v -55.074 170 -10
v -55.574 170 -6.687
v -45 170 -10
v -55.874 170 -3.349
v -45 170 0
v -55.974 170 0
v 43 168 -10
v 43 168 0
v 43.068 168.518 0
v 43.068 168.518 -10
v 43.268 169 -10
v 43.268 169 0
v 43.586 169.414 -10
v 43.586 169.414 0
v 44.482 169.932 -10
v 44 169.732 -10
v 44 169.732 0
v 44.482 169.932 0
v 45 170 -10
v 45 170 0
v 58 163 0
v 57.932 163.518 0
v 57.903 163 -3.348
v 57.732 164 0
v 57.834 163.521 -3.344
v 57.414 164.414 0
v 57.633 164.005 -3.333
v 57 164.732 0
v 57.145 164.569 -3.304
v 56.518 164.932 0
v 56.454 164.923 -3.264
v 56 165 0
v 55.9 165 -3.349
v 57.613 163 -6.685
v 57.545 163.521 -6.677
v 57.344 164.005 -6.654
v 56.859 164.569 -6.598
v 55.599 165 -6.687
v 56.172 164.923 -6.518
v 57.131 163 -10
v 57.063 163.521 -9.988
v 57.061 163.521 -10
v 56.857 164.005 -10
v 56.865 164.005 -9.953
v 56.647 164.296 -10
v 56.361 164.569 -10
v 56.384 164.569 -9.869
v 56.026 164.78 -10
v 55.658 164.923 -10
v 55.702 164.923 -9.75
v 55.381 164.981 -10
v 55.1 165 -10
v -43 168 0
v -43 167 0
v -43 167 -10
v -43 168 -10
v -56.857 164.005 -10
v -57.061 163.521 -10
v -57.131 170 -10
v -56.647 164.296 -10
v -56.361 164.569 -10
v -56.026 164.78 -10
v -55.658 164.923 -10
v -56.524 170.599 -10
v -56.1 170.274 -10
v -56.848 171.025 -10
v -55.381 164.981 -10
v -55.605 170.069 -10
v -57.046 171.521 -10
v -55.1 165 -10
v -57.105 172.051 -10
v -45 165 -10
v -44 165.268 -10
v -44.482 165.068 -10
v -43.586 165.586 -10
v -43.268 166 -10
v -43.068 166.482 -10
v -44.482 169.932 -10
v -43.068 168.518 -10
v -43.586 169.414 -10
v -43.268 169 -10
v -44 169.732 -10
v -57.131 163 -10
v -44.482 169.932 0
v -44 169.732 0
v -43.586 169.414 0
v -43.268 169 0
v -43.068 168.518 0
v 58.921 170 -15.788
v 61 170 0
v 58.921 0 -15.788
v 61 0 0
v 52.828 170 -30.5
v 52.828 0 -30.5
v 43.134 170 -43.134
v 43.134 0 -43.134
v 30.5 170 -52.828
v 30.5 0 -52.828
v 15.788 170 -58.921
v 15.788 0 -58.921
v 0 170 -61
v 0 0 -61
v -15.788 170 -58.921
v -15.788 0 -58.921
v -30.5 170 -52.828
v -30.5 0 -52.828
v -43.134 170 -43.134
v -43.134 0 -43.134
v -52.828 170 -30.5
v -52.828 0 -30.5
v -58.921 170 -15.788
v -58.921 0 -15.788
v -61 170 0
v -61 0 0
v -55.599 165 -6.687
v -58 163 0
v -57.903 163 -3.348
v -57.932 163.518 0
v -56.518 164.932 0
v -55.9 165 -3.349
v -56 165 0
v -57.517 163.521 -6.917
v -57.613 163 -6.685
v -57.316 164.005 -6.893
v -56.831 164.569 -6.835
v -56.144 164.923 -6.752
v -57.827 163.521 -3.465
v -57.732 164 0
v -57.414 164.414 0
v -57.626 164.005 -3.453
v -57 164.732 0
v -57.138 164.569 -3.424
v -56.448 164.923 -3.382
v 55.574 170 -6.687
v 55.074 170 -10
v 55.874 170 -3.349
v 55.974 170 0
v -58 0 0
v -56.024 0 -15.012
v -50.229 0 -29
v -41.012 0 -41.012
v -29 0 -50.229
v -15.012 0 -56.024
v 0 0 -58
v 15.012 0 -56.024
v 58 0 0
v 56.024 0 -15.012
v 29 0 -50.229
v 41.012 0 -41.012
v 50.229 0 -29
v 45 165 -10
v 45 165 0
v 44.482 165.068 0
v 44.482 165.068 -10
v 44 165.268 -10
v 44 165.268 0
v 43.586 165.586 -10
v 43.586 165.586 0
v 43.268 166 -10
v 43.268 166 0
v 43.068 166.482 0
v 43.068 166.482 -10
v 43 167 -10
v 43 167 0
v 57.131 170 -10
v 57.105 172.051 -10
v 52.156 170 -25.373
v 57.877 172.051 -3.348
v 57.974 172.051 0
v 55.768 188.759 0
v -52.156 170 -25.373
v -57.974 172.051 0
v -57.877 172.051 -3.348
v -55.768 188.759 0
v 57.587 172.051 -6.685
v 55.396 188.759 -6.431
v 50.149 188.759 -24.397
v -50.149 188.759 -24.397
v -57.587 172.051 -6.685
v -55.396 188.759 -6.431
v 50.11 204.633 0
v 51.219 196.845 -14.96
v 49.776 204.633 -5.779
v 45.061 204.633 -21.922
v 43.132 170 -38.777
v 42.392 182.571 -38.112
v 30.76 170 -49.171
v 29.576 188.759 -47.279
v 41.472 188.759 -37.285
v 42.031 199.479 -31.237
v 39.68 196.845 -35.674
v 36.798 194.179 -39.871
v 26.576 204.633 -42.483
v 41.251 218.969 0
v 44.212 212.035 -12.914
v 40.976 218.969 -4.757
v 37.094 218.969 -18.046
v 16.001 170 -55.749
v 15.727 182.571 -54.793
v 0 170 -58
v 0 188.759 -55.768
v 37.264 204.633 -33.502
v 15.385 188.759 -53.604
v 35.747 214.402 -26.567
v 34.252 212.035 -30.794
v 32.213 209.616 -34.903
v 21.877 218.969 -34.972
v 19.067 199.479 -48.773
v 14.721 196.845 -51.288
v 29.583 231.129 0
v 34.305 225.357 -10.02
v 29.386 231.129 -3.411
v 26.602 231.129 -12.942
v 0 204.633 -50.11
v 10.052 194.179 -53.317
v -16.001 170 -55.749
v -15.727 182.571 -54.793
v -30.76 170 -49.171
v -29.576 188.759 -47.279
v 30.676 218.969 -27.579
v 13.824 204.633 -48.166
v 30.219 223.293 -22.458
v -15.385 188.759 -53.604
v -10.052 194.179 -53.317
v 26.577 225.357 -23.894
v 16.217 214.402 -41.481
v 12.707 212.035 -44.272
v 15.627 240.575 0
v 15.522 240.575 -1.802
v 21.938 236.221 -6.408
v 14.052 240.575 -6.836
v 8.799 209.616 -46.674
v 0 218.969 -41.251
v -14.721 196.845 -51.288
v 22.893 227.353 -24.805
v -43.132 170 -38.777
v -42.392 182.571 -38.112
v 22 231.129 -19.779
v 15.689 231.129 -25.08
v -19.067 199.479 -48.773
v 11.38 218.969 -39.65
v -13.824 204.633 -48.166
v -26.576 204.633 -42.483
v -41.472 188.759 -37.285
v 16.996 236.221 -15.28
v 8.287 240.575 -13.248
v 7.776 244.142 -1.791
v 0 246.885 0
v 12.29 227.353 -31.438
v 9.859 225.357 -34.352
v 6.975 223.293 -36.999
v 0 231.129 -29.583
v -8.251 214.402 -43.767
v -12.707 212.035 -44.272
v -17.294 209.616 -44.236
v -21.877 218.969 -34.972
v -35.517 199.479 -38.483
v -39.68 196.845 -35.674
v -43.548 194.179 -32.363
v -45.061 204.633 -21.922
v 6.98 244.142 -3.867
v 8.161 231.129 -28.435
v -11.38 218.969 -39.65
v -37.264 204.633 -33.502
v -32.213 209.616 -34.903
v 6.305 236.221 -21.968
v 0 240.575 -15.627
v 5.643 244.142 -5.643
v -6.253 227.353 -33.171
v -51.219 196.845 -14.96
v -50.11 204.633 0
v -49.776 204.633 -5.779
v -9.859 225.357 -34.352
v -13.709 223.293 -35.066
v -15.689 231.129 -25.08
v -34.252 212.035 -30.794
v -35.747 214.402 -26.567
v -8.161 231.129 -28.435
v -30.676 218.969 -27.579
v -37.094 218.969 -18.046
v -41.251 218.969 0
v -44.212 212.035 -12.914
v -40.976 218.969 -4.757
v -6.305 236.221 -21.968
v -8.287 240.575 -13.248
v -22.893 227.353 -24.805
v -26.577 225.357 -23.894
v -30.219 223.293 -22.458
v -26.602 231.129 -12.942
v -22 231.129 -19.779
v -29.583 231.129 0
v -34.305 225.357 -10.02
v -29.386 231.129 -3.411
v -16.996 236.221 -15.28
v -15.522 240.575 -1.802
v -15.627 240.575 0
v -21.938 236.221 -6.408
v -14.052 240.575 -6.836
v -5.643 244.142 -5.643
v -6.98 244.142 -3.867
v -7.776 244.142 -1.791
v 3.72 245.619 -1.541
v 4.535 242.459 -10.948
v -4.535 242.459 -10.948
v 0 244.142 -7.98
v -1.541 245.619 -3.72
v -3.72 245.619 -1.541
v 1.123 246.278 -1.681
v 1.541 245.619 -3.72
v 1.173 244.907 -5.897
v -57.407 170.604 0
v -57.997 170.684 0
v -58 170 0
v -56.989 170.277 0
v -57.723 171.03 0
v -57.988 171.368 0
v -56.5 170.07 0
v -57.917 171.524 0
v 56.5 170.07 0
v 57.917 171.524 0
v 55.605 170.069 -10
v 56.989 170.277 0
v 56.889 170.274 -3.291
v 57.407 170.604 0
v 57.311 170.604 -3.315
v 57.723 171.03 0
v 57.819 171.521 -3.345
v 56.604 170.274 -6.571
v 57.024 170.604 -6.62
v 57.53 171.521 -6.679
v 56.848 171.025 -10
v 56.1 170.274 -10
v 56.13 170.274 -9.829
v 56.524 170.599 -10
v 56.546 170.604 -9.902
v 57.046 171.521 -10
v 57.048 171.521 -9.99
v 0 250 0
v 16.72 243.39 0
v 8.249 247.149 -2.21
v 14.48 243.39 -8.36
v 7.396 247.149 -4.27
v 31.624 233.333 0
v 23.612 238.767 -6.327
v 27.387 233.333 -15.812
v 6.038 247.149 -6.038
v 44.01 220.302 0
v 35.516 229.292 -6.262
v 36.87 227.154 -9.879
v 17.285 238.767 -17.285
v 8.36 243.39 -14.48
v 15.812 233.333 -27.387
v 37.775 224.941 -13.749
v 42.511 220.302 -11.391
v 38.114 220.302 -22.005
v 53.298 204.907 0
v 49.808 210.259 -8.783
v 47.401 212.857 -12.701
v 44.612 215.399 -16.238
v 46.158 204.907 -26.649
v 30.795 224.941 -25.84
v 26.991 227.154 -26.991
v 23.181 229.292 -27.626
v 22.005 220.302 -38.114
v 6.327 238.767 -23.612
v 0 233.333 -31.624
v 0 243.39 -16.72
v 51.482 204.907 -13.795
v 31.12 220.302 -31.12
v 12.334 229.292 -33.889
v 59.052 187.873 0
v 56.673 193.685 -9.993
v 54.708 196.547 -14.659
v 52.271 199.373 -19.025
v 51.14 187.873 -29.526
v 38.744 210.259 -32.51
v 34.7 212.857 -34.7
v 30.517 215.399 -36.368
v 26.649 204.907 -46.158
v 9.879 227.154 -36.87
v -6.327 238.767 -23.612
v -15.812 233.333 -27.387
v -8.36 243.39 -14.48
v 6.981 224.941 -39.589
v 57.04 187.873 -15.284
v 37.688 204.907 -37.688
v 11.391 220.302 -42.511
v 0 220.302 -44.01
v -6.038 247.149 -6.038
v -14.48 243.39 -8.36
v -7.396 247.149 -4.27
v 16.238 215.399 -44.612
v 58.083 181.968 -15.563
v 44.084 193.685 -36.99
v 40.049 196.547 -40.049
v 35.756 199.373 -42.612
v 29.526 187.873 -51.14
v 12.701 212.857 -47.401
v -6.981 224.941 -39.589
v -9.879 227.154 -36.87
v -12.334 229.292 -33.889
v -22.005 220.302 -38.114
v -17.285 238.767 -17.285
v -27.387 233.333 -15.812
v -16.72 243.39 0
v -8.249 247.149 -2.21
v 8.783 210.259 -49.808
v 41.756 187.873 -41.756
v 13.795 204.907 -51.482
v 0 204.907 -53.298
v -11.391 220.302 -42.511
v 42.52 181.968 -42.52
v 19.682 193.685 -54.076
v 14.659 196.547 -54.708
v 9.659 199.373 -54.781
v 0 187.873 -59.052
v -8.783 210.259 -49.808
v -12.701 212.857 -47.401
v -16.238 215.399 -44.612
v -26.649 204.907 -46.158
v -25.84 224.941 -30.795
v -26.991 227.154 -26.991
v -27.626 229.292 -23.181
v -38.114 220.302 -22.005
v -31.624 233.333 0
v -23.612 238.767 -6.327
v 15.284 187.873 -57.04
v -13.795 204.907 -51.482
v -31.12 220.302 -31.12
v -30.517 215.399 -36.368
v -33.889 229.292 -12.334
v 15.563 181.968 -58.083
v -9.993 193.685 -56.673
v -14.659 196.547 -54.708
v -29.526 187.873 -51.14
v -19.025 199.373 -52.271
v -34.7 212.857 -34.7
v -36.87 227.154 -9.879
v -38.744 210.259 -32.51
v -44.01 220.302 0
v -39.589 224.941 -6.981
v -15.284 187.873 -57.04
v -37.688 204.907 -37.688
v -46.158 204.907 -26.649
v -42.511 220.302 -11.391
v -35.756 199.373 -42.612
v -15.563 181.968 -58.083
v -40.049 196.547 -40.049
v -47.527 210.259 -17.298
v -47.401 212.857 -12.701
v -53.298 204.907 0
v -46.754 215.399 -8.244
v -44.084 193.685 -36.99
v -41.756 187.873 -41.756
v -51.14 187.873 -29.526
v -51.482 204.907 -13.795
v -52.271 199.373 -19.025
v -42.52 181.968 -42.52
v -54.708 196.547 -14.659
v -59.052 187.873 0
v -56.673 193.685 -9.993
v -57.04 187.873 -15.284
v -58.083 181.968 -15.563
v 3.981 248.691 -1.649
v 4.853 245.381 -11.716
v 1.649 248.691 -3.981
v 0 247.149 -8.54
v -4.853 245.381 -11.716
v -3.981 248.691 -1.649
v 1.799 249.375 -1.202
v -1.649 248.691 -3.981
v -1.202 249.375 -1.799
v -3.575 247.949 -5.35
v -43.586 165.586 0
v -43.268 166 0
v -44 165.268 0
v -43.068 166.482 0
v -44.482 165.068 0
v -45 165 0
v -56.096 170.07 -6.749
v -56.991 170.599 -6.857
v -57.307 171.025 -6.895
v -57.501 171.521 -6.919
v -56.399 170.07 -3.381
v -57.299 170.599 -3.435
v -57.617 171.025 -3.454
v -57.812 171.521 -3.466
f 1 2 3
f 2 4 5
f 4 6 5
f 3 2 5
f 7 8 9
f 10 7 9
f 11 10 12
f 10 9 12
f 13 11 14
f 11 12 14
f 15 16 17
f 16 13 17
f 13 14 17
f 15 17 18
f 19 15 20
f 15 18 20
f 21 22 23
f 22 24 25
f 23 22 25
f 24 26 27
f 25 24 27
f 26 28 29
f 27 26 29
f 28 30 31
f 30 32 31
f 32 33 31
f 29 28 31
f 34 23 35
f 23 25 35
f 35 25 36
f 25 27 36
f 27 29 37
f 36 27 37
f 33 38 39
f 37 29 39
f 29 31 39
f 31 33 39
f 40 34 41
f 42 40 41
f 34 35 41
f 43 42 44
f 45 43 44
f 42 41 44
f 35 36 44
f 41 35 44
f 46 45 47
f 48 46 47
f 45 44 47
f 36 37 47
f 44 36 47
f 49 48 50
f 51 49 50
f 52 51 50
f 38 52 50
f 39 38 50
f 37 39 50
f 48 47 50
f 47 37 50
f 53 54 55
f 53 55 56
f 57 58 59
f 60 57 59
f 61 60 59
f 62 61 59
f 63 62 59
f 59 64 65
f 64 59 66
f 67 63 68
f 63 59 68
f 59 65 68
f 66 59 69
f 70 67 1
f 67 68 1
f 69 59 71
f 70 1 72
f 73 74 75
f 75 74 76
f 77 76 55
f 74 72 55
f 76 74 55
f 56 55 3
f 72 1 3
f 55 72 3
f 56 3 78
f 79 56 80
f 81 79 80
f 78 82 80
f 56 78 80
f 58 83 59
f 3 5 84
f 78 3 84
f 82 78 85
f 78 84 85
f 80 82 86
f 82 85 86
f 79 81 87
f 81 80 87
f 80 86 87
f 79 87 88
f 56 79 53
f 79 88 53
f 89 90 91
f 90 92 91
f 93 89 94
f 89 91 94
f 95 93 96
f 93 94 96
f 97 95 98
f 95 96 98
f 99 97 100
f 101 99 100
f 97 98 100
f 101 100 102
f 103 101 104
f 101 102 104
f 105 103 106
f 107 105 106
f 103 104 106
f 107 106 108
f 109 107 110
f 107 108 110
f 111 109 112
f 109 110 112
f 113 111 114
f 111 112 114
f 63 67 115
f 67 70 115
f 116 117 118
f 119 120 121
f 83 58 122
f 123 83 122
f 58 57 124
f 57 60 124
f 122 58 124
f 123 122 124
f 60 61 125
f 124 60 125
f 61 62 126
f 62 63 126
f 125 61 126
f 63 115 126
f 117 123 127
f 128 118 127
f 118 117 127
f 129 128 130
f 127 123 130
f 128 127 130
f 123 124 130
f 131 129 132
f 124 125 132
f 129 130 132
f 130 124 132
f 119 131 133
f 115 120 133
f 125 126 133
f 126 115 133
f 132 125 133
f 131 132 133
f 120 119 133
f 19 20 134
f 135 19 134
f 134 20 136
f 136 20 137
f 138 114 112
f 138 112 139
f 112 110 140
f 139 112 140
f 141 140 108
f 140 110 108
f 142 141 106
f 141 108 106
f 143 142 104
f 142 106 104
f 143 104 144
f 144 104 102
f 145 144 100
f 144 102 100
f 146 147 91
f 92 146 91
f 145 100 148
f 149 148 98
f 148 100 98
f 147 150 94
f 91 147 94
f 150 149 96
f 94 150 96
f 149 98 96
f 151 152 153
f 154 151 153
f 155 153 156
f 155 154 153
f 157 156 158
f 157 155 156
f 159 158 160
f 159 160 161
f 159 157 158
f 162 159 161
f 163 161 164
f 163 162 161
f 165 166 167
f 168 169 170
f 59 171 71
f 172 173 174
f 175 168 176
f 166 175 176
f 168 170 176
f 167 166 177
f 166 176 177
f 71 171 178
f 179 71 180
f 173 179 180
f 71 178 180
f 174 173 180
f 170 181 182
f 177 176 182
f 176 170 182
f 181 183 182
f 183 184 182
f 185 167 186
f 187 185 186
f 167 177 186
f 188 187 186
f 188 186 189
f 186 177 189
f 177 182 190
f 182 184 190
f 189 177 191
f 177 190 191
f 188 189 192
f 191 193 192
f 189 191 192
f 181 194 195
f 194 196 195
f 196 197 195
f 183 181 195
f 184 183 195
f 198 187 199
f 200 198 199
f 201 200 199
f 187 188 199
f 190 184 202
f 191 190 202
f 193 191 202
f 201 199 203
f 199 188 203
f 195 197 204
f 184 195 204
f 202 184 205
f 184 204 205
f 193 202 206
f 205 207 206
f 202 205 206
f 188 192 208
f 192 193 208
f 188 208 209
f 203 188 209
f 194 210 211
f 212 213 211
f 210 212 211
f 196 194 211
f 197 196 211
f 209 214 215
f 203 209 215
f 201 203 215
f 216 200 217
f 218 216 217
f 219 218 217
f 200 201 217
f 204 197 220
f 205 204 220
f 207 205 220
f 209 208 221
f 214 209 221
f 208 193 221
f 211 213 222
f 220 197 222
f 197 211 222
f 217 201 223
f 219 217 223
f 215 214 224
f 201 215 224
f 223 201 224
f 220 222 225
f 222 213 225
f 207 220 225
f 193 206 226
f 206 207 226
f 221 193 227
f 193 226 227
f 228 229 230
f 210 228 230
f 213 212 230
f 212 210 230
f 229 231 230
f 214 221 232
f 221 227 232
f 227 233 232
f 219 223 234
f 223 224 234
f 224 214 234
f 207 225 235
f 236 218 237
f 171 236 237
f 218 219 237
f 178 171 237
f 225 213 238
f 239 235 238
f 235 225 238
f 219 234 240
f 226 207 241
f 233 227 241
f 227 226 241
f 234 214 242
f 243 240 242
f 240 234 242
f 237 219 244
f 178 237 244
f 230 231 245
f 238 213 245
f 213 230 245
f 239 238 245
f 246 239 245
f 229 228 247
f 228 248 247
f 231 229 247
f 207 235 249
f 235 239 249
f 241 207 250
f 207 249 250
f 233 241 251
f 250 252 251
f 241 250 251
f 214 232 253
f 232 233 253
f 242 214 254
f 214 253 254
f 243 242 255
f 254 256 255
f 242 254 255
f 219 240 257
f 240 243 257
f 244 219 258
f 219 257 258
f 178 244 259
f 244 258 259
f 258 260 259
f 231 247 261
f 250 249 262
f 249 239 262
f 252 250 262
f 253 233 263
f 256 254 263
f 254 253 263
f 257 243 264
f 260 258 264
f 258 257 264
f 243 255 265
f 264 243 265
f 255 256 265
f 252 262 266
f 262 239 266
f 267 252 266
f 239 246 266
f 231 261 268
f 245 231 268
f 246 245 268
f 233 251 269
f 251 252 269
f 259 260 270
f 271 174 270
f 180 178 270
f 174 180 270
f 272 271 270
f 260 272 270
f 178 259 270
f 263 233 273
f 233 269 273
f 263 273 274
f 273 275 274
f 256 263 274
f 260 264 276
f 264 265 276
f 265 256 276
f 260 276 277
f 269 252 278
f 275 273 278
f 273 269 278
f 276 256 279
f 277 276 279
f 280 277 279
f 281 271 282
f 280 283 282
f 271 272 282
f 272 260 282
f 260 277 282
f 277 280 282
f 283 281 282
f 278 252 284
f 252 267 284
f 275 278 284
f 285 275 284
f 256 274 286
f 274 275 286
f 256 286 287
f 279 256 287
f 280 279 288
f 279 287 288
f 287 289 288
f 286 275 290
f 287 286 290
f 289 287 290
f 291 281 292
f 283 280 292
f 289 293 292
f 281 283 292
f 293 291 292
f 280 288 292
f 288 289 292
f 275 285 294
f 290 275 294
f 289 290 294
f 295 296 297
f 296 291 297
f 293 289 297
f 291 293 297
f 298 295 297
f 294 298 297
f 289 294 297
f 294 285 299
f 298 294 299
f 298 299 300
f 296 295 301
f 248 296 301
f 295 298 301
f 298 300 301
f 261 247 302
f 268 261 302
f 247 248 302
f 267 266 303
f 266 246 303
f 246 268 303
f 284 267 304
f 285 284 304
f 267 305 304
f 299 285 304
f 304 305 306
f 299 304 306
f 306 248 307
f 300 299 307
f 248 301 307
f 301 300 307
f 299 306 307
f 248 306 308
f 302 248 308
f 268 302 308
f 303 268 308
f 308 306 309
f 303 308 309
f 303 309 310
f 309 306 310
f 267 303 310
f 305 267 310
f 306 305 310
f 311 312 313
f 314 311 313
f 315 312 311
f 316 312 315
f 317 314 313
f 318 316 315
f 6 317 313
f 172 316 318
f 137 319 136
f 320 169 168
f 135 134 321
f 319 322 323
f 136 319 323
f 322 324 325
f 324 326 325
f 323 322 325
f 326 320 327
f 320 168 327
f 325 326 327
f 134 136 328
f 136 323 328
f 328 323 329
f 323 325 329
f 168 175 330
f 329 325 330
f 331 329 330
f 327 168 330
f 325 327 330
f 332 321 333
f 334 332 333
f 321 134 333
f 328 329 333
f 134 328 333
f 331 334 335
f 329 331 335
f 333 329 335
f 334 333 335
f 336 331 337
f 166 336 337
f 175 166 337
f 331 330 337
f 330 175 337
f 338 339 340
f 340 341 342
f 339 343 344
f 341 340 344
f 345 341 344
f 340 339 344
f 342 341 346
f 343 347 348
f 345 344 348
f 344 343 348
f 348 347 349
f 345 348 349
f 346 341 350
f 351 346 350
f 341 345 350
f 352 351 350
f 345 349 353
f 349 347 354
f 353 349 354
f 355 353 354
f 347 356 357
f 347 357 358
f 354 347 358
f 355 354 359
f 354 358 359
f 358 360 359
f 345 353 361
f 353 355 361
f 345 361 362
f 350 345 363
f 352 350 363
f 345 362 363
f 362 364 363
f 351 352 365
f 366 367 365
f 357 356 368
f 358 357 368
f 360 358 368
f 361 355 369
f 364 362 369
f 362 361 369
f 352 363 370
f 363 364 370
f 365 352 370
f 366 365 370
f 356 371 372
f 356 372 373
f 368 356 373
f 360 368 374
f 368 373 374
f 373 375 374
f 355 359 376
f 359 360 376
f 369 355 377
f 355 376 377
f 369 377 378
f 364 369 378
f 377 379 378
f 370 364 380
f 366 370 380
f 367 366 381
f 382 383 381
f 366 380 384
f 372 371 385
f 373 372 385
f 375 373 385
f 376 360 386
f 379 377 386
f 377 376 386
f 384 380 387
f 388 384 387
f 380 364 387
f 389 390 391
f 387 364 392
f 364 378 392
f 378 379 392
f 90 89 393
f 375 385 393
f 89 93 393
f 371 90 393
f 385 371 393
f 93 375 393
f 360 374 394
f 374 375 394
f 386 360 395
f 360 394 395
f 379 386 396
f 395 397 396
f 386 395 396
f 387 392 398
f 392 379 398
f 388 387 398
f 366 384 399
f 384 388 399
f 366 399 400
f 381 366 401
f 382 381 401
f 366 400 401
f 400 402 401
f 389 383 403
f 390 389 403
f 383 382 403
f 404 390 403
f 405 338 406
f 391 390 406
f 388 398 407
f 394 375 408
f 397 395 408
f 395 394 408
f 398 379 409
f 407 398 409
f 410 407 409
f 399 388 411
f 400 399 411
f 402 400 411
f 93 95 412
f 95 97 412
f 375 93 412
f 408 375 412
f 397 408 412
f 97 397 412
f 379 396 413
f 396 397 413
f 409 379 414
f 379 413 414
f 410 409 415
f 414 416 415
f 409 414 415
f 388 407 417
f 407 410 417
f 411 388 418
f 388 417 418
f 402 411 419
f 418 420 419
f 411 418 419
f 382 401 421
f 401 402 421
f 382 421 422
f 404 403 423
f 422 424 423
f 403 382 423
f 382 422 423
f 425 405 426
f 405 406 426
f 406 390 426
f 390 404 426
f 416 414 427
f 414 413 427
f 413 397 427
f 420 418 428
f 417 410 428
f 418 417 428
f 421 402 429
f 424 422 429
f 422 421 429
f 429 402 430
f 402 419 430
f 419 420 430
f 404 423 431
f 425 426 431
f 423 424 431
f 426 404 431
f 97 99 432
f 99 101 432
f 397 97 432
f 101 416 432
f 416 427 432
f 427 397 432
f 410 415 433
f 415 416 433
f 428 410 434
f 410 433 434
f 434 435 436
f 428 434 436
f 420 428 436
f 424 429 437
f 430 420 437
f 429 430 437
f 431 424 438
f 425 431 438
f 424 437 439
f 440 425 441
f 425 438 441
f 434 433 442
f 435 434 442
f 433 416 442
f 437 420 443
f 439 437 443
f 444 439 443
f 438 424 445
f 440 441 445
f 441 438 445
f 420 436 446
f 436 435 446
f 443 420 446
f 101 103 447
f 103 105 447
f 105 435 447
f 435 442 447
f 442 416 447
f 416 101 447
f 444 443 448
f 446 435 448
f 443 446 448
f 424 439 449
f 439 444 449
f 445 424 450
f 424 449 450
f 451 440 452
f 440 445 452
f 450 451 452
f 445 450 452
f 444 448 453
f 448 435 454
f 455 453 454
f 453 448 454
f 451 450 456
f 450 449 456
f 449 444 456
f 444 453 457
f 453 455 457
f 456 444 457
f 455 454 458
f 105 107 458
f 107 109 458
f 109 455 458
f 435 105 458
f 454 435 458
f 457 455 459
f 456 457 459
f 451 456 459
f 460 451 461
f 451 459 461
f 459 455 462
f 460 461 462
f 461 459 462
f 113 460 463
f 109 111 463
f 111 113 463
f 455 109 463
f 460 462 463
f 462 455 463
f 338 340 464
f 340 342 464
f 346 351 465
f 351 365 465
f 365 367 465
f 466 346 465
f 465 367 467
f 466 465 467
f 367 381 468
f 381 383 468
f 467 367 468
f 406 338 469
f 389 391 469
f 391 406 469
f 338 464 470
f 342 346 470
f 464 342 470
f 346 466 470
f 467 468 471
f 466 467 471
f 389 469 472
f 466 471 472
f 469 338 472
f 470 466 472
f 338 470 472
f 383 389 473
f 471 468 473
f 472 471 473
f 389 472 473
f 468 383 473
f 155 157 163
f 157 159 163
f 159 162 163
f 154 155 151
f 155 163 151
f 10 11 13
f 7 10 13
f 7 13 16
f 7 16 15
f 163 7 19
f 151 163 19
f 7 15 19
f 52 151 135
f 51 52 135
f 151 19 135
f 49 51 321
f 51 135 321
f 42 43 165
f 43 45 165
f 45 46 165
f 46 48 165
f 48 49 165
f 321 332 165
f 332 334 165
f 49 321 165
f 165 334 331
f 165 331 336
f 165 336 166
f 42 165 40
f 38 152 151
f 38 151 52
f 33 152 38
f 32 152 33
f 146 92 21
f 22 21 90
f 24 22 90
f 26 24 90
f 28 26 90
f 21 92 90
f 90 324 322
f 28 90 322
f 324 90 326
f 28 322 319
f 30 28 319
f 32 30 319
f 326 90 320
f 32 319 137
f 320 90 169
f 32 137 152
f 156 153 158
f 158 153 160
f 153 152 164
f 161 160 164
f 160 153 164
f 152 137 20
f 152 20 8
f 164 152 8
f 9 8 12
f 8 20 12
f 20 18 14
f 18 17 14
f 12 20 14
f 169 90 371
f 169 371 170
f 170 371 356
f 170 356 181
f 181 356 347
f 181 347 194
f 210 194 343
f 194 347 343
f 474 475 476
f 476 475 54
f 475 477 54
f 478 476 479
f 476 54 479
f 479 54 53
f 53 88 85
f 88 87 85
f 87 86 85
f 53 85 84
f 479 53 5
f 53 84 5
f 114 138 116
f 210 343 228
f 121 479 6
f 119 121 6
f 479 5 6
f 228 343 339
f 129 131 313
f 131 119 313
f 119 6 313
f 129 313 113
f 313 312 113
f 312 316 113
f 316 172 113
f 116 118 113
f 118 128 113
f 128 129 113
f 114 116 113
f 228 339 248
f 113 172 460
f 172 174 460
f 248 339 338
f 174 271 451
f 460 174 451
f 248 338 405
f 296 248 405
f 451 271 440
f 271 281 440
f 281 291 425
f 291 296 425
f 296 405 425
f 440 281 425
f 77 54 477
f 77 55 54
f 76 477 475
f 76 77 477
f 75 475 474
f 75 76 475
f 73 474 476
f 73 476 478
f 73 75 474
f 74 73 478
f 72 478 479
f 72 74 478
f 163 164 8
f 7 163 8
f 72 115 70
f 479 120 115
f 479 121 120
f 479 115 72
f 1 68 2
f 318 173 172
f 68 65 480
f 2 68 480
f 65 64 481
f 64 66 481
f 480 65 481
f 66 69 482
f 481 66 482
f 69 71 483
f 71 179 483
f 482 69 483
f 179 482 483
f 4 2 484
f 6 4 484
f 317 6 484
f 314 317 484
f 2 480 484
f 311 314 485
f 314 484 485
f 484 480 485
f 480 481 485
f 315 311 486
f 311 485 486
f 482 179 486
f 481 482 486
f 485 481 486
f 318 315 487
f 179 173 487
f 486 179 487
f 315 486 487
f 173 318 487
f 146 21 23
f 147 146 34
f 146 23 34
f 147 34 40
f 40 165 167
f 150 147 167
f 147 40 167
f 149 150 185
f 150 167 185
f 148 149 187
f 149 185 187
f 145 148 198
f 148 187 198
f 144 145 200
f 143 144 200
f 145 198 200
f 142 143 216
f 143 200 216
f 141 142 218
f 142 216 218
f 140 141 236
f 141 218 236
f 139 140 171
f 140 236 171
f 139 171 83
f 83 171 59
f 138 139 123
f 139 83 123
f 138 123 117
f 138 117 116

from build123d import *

# Parameters (mm, degrees)
REVOLVE1_ANGLE      = 180
SKETCH2_W           = 15
SKETCH2_H           = 5
BOSS_EXTRUDE1_DEPTH = 10
FILLET2_R           = 2
FILLET3_R           = 2
FILLET4_R           = 2
FILLET5_R           = 2
FILLET6_R           = 2


with BuildPart() as part:
    # Sketch1 → Revolve1 (revolve)
    with BuildSketch(Plane.XY):
        with BuildLine():
            Line((61, 170), (61, 0))
            Line((61, 0), (58, 0))
            Line((58, 0), (58, 170))
            ThreePointArc((58, 170), (41.873834296, 218.154039035), (0, 246.884627213))
            Line((0, 246.884627213), (0, 250))
            ThreePointArc((0, 250), (44.010282534, 220.301590432), (61, 170))
        make_face()
    revolve(axis=Axis((0, 0, 0), (0, 1, 0)), revolution_arc=REVOLVE1_ANGLE)

    # Sketch2 → Boss-Extrude1 (add)
    with BuildSketch(Plane.XY):
        with Locations((50.5, 167.5)):
            Rectangle(SKETCH2_W, SKETCH2_H)
        with Locations((-50.5, 167.5)):
            Rectangle(SKETCH2_W, SKETCH2_H)
    extrude(amount=-BOSS_EXTRUDE1_DEPTH)

    # Fillet2
    # the kernel refuses this fillet: 2 mm, written as the material it adds along each edge
    with BuildSketch(Plane(origin=(0, 170, 0), x_dir=(1, 0, 0), z_dir=(0, 0, 1))) as fillet2_piece_1_section:
        with BuildLine():
            CenterArc((55.974341272, 2), FILLET2_R, 270, 91.470056164)
            Line((55.974341272, 0), (58, 0))
            ThreePointArc((58, 0), (57.993420482, 1.025738909), (57.97368301, 2.051309011))
        make_face()
    fillet2_piece_1 = revolve(axis=Axis((0, 170, 0), (0, 1, 0)), revolution_arc=14.994639912, mode=Mode.PRIVATE)
    fillet2_piece_1 = split(fillet2_piece_1, bisect_by=Plane(origin=(57.246854663, 170.465829225, -10), z_dir=(0, 0, 1)), keep=Keep.TOP, mode=Mode.PRIVATE)
    add(fillet2_piece_1)
    with BuildSketch(Plane(origin=(0, 170, 0), x_dir=(-0.9659500348920197, 0, -0.2587286804590979), z_dir=(0.2587286804590979, 0, -0.9659500348920197))) as fillet2_piece_2_section:
        with BuildLine():
            CenterArc((55.974341272, 2), FILLET2_R, 270, 91.470056164)
            Line((55.974341272, 0), (58, 0))
            ThreePointArc((58, 0), (57.993420482, 1.025738909), (57.97368301, 2.051309011))
        make_face()
    fillet2_piece_2 = revolve(axis=Axis((0, 170, 0), (0, 1, 0)), revolution_arc=14.994639912, mode=Mode.PRIVATE)
    fillet2_piece_2 = split(fillet2_piece_2, bisect_by=Plane(origin=(-57.246854909, 170.465829269, -10), z_dir=(0, 0, 1)), keep=Keep.TOP, mode=Mode.PRIVATE)
    add(fillet2_piece_2)
    # the kernel refuses this fillet: 2 mm, written as the material it takes off along each edge
    with BuildSketch(Plane(origin=(43, 170, 5), x_dir=(0, -1, 0), z_dir=(0, 0, -1)), Plane(origin=(-43, 170, 5), x_dir=(-1, 0, 0), z_dir=(0, 0, -1))) as fillet2_2_piece_1:
        with BuildLine():
            CenterArc((FILLET2_R, -FILLET2_R), FILLET2_R, 90, 90)
            Line((0, -FILLET2_R), (0, 0))
            Line((0, 0), (FILLET2_R, 0))
        make_face()
    extrude(amount=20, mode=Mode.SUBTRACT)

    # Fillet3
    fillet3_edges = [part.edges().sort_by_distance(p)[0] for p in [
        (57.782448853, 165, -5.01882502),
    ]]
    fillet(fillet3_edges, radius=FILLET3_R)

    # Fillet4
    fillet4_edges = [part.edges().sort_by_distance(p)[0] for p in [
        (-57.782448853, 165, -5.01882502),
    ]]
    fillet(fillet4_edges, radius=FILLET4_R)

    # Fillet5
    fillet5_edges = [part.edges().sort_by_distance(p)[0] for p in [
        (-43, 165, -5),
    ]]
    fillet(fillet5_edges, radius=FILLET5_R)

    # Fillet6
    fillet6_edges = [part.edges().sort_by_distance(p)[0] for p in [
        (43, 165, -5),
    ]]
    fillet(fillet6_edges, radius=FILLET6_R)


solid = part.part
